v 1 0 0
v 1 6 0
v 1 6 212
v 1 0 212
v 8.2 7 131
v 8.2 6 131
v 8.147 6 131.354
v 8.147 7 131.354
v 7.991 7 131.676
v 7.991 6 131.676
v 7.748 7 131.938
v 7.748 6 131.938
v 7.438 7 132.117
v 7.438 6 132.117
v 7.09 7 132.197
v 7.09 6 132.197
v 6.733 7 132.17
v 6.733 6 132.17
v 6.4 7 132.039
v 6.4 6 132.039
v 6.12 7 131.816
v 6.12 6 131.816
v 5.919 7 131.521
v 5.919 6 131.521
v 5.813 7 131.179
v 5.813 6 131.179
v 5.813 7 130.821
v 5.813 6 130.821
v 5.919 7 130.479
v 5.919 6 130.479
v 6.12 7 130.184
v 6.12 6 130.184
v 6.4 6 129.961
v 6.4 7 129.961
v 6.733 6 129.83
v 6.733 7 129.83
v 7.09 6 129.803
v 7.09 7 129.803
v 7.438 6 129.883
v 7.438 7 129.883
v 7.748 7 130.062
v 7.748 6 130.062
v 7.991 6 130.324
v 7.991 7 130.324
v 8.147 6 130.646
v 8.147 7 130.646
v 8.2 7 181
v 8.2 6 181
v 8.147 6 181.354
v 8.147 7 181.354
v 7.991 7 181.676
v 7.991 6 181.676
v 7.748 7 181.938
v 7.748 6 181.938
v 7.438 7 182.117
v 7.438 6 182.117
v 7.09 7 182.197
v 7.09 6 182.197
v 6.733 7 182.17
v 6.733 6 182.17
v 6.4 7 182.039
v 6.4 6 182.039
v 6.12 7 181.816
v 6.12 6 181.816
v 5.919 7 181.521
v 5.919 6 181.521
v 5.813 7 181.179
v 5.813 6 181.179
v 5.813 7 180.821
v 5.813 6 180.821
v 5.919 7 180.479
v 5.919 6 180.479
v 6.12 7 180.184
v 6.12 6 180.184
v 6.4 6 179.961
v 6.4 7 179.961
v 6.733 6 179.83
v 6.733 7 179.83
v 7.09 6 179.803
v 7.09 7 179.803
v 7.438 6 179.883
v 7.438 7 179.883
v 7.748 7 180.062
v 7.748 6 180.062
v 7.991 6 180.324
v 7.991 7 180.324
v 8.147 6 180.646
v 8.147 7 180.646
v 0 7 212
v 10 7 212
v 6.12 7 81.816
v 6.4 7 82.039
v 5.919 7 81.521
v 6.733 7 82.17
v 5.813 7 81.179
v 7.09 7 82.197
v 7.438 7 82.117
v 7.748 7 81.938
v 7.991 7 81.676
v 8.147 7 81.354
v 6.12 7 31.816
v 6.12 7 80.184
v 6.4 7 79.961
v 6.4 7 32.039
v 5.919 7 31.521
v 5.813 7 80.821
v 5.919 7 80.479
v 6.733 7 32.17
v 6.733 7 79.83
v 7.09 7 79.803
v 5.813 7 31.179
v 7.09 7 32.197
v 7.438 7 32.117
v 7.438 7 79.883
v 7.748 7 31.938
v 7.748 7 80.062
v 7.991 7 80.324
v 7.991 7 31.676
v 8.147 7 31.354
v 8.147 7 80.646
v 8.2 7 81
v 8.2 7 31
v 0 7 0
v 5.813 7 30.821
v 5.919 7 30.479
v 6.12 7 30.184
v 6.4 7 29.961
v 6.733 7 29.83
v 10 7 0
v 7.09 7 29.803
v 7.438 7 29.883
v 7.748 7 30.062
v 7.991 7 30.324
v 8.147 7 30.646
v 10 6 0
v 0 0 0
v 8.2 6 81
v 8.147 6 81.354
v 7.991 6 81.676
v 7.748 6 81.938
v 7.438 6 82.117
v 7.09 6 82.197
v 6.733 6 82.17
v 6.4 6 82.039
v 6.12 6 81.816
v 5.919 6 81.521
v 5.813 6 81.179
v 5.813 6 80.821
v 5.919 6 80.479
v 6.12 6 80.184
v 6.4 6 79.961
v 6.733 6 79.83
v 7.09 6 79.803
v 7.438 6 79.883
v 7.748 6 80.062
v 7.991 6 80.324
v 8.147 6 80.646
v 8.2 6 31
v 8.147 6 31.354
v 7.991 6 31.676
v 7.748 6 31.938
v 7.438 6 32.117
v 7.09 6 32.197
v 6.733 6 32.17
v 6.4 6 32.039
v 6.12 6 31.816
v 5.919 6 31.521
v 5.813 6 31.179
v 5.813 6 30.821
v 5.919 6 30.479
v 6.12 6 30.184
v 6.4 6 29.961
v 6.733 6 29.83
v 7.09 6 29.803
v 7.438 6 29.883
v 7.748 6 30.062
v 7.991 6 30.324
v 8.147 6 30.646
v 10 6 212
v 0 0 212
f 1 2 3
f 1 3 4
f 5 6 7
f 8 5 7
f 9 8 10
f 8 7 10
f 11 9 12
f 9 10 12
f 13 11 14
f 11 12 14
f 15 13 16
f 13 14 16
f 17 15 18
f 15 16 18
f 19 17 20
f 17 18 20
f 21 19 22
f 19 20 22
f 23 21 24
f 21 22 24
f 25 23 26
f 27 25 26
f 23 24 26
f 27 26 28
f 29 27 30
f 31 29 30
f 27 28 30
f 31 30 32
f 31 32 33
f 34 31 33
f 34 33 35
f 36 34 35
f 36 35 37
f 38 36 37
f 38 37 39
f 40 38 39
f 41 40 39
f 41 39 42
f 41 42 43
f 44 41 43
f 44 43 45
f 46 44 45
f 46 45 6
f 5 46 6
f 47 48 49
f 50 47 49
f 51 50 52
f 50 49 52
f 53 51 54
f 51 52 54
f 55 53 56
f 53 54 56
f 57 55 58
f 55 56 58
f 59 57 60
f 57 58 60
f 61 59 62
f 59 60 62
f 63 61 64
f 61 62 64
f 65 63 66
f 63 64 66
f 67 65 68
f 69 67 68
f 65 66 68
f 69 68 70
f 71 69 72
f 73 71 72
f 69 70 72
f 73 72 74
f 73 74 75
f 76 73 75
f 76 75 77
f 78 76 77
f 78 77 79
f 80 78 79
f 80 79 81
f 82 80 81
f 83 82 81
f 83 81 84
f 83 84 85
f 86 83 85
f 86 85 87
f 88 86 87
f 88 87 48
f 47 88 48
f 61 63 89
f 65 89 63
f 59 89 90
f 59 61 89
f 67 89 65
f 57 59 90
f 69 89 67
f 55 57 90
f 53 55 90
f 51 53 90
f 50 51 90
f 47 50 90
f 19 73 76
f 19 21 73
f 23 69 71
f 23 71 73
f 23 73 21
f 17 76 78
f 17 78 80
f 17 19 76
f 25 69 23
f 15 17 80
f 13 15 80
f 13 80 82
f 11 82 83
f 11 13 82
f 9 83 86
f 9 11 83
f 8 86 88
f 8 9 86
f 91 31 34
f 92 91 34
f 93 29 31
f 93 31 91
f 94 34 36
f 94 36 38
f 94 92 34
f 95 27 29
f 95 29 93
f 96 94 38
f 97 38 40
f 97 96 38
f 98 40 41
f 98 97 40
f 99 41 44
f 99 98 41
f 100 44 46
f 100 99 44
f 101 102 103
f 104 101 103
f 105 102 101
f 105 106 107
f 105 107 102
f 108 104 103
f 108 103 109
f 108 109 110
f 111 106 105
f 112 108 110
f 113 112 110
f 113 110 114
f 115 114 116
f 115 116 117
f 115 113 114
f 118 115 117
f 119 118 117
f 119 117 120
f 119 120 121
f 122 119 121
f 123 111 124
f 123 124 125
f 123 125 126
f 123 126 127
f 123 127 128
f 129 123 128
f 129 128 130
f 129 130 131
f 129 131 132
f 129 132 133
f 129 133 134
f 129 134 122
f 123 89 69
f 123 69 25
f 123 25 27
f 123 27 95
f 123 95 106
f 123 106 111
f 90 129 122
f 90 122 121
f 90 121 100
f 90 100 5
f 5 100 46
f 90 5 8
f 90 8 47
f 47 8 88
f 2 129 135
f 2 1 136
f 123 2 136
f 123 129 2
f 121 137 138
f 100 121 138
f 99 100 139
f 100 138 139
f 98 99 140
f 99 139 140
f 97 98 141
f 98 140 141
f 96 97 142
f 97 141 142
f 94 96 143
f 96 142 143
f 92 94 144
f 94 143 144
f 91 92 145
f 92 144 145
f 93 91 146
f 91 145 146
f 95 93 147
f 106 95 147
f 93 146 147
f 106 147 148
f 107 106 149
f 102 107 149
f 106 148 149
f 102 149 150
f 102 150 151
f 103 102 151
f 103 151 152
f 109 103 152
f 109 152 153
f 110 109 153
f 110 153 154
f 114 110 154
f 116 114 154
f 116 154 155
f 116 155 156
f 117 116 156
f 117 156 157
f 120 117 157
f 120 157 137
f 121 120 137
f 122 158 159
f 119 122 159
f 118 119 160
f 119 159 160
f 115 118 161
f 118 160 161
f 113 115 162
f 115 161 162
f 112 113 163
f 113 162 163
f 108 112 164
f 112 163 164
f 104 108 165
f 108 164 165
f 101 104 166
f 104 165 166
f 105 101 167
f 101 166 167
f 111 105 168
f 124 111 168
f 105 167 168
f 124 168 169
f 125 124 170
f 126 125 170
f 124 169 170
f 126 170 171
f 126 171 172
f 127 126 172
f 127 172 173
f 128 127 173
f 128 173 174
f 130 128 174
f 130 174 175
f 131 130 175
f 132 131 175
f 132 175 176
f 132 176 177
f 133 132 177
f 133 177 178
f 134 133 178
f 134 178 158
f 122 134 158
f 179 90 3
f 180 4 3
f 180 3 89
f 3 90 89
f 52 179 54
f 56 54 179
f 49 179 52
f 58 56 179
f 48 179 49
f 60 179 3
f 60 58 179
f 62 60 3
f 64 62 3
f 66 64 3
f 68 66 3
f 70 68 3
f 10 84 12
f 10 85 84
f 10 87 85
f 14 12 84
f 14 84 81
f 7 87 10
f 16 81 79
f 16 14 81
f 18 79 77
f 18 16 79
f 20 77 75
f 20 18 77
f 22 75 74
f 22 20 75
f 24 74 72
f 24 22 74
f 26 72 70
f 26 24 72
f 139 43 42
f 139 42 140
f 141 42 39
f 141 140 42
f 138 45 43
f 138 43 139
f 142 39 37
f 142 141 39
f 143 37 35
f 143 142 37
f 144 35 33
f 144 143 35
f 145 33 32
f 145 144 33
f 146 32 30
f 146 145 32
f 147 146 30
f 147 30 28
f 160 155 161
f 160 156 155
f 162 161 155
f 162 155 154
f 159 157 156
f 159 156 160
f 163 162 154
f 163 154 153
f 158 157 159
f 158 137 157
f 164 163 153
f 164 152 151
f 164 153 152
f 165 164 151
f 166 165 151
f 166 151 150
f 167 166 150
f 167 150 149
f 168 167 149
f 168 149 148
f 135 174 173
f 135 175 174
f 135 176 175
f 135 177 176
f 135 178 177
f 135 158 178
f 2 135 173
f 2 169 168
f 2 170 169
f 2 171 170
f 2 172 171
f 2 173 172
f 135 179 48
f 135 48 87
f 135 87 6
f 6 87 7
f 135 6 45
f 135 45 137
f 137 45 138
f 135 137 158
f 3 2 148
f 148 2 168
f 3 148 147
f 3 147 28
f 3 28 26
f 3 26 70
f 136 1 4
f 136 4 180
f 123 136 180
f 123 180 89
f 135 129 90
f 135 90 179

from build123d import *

# Parameters (mm, degrees)
EXTRUDE_1_DEPTH       = 212
HOLE_WIZARD_M21_D     = 2.4
HOLE_WIZARD_M21_DEPTH = 5
HOLE_WIZARD_M21_TIP   = 0.721032743


with BuildPart() as part:
    # Эскиз1 → Бобышка-Вытянуть1 (new body)
    with BuildSketch(Plane.XY):
        Polygon((0, 0), (0, 7), (10, 7), (10, 6), (1, 6), (1, 0), align=None)
    extrude(amount=EXTRUDE_1_DEPTH)

    # Отверстие с зазором M21
    with Locations(Plane(origin=(0, 7, 0), x_dir=(-1, 0, 0), z_dir=(0, 1, 0))):
        with Locations((-7, 131), (-7, 81), (-7, 31), (-7, 181)):
            Hole(HOLE_WIZARD_M21_D / 2, depth=HOLE_WIZARD_M21_DEPTH)
            with Locations((0, 0, -(HOLE_WIZARD_M21_DEPTH + HOLE_WIZARD_M21_TIP / 2))):  # 118° drill point
                Cone(0, HOLE_WIZARD_M21_D / 2, HOLE_WIZARD_M21_TIP, mode=Mode.SUBTRACT)


solid = part.part
